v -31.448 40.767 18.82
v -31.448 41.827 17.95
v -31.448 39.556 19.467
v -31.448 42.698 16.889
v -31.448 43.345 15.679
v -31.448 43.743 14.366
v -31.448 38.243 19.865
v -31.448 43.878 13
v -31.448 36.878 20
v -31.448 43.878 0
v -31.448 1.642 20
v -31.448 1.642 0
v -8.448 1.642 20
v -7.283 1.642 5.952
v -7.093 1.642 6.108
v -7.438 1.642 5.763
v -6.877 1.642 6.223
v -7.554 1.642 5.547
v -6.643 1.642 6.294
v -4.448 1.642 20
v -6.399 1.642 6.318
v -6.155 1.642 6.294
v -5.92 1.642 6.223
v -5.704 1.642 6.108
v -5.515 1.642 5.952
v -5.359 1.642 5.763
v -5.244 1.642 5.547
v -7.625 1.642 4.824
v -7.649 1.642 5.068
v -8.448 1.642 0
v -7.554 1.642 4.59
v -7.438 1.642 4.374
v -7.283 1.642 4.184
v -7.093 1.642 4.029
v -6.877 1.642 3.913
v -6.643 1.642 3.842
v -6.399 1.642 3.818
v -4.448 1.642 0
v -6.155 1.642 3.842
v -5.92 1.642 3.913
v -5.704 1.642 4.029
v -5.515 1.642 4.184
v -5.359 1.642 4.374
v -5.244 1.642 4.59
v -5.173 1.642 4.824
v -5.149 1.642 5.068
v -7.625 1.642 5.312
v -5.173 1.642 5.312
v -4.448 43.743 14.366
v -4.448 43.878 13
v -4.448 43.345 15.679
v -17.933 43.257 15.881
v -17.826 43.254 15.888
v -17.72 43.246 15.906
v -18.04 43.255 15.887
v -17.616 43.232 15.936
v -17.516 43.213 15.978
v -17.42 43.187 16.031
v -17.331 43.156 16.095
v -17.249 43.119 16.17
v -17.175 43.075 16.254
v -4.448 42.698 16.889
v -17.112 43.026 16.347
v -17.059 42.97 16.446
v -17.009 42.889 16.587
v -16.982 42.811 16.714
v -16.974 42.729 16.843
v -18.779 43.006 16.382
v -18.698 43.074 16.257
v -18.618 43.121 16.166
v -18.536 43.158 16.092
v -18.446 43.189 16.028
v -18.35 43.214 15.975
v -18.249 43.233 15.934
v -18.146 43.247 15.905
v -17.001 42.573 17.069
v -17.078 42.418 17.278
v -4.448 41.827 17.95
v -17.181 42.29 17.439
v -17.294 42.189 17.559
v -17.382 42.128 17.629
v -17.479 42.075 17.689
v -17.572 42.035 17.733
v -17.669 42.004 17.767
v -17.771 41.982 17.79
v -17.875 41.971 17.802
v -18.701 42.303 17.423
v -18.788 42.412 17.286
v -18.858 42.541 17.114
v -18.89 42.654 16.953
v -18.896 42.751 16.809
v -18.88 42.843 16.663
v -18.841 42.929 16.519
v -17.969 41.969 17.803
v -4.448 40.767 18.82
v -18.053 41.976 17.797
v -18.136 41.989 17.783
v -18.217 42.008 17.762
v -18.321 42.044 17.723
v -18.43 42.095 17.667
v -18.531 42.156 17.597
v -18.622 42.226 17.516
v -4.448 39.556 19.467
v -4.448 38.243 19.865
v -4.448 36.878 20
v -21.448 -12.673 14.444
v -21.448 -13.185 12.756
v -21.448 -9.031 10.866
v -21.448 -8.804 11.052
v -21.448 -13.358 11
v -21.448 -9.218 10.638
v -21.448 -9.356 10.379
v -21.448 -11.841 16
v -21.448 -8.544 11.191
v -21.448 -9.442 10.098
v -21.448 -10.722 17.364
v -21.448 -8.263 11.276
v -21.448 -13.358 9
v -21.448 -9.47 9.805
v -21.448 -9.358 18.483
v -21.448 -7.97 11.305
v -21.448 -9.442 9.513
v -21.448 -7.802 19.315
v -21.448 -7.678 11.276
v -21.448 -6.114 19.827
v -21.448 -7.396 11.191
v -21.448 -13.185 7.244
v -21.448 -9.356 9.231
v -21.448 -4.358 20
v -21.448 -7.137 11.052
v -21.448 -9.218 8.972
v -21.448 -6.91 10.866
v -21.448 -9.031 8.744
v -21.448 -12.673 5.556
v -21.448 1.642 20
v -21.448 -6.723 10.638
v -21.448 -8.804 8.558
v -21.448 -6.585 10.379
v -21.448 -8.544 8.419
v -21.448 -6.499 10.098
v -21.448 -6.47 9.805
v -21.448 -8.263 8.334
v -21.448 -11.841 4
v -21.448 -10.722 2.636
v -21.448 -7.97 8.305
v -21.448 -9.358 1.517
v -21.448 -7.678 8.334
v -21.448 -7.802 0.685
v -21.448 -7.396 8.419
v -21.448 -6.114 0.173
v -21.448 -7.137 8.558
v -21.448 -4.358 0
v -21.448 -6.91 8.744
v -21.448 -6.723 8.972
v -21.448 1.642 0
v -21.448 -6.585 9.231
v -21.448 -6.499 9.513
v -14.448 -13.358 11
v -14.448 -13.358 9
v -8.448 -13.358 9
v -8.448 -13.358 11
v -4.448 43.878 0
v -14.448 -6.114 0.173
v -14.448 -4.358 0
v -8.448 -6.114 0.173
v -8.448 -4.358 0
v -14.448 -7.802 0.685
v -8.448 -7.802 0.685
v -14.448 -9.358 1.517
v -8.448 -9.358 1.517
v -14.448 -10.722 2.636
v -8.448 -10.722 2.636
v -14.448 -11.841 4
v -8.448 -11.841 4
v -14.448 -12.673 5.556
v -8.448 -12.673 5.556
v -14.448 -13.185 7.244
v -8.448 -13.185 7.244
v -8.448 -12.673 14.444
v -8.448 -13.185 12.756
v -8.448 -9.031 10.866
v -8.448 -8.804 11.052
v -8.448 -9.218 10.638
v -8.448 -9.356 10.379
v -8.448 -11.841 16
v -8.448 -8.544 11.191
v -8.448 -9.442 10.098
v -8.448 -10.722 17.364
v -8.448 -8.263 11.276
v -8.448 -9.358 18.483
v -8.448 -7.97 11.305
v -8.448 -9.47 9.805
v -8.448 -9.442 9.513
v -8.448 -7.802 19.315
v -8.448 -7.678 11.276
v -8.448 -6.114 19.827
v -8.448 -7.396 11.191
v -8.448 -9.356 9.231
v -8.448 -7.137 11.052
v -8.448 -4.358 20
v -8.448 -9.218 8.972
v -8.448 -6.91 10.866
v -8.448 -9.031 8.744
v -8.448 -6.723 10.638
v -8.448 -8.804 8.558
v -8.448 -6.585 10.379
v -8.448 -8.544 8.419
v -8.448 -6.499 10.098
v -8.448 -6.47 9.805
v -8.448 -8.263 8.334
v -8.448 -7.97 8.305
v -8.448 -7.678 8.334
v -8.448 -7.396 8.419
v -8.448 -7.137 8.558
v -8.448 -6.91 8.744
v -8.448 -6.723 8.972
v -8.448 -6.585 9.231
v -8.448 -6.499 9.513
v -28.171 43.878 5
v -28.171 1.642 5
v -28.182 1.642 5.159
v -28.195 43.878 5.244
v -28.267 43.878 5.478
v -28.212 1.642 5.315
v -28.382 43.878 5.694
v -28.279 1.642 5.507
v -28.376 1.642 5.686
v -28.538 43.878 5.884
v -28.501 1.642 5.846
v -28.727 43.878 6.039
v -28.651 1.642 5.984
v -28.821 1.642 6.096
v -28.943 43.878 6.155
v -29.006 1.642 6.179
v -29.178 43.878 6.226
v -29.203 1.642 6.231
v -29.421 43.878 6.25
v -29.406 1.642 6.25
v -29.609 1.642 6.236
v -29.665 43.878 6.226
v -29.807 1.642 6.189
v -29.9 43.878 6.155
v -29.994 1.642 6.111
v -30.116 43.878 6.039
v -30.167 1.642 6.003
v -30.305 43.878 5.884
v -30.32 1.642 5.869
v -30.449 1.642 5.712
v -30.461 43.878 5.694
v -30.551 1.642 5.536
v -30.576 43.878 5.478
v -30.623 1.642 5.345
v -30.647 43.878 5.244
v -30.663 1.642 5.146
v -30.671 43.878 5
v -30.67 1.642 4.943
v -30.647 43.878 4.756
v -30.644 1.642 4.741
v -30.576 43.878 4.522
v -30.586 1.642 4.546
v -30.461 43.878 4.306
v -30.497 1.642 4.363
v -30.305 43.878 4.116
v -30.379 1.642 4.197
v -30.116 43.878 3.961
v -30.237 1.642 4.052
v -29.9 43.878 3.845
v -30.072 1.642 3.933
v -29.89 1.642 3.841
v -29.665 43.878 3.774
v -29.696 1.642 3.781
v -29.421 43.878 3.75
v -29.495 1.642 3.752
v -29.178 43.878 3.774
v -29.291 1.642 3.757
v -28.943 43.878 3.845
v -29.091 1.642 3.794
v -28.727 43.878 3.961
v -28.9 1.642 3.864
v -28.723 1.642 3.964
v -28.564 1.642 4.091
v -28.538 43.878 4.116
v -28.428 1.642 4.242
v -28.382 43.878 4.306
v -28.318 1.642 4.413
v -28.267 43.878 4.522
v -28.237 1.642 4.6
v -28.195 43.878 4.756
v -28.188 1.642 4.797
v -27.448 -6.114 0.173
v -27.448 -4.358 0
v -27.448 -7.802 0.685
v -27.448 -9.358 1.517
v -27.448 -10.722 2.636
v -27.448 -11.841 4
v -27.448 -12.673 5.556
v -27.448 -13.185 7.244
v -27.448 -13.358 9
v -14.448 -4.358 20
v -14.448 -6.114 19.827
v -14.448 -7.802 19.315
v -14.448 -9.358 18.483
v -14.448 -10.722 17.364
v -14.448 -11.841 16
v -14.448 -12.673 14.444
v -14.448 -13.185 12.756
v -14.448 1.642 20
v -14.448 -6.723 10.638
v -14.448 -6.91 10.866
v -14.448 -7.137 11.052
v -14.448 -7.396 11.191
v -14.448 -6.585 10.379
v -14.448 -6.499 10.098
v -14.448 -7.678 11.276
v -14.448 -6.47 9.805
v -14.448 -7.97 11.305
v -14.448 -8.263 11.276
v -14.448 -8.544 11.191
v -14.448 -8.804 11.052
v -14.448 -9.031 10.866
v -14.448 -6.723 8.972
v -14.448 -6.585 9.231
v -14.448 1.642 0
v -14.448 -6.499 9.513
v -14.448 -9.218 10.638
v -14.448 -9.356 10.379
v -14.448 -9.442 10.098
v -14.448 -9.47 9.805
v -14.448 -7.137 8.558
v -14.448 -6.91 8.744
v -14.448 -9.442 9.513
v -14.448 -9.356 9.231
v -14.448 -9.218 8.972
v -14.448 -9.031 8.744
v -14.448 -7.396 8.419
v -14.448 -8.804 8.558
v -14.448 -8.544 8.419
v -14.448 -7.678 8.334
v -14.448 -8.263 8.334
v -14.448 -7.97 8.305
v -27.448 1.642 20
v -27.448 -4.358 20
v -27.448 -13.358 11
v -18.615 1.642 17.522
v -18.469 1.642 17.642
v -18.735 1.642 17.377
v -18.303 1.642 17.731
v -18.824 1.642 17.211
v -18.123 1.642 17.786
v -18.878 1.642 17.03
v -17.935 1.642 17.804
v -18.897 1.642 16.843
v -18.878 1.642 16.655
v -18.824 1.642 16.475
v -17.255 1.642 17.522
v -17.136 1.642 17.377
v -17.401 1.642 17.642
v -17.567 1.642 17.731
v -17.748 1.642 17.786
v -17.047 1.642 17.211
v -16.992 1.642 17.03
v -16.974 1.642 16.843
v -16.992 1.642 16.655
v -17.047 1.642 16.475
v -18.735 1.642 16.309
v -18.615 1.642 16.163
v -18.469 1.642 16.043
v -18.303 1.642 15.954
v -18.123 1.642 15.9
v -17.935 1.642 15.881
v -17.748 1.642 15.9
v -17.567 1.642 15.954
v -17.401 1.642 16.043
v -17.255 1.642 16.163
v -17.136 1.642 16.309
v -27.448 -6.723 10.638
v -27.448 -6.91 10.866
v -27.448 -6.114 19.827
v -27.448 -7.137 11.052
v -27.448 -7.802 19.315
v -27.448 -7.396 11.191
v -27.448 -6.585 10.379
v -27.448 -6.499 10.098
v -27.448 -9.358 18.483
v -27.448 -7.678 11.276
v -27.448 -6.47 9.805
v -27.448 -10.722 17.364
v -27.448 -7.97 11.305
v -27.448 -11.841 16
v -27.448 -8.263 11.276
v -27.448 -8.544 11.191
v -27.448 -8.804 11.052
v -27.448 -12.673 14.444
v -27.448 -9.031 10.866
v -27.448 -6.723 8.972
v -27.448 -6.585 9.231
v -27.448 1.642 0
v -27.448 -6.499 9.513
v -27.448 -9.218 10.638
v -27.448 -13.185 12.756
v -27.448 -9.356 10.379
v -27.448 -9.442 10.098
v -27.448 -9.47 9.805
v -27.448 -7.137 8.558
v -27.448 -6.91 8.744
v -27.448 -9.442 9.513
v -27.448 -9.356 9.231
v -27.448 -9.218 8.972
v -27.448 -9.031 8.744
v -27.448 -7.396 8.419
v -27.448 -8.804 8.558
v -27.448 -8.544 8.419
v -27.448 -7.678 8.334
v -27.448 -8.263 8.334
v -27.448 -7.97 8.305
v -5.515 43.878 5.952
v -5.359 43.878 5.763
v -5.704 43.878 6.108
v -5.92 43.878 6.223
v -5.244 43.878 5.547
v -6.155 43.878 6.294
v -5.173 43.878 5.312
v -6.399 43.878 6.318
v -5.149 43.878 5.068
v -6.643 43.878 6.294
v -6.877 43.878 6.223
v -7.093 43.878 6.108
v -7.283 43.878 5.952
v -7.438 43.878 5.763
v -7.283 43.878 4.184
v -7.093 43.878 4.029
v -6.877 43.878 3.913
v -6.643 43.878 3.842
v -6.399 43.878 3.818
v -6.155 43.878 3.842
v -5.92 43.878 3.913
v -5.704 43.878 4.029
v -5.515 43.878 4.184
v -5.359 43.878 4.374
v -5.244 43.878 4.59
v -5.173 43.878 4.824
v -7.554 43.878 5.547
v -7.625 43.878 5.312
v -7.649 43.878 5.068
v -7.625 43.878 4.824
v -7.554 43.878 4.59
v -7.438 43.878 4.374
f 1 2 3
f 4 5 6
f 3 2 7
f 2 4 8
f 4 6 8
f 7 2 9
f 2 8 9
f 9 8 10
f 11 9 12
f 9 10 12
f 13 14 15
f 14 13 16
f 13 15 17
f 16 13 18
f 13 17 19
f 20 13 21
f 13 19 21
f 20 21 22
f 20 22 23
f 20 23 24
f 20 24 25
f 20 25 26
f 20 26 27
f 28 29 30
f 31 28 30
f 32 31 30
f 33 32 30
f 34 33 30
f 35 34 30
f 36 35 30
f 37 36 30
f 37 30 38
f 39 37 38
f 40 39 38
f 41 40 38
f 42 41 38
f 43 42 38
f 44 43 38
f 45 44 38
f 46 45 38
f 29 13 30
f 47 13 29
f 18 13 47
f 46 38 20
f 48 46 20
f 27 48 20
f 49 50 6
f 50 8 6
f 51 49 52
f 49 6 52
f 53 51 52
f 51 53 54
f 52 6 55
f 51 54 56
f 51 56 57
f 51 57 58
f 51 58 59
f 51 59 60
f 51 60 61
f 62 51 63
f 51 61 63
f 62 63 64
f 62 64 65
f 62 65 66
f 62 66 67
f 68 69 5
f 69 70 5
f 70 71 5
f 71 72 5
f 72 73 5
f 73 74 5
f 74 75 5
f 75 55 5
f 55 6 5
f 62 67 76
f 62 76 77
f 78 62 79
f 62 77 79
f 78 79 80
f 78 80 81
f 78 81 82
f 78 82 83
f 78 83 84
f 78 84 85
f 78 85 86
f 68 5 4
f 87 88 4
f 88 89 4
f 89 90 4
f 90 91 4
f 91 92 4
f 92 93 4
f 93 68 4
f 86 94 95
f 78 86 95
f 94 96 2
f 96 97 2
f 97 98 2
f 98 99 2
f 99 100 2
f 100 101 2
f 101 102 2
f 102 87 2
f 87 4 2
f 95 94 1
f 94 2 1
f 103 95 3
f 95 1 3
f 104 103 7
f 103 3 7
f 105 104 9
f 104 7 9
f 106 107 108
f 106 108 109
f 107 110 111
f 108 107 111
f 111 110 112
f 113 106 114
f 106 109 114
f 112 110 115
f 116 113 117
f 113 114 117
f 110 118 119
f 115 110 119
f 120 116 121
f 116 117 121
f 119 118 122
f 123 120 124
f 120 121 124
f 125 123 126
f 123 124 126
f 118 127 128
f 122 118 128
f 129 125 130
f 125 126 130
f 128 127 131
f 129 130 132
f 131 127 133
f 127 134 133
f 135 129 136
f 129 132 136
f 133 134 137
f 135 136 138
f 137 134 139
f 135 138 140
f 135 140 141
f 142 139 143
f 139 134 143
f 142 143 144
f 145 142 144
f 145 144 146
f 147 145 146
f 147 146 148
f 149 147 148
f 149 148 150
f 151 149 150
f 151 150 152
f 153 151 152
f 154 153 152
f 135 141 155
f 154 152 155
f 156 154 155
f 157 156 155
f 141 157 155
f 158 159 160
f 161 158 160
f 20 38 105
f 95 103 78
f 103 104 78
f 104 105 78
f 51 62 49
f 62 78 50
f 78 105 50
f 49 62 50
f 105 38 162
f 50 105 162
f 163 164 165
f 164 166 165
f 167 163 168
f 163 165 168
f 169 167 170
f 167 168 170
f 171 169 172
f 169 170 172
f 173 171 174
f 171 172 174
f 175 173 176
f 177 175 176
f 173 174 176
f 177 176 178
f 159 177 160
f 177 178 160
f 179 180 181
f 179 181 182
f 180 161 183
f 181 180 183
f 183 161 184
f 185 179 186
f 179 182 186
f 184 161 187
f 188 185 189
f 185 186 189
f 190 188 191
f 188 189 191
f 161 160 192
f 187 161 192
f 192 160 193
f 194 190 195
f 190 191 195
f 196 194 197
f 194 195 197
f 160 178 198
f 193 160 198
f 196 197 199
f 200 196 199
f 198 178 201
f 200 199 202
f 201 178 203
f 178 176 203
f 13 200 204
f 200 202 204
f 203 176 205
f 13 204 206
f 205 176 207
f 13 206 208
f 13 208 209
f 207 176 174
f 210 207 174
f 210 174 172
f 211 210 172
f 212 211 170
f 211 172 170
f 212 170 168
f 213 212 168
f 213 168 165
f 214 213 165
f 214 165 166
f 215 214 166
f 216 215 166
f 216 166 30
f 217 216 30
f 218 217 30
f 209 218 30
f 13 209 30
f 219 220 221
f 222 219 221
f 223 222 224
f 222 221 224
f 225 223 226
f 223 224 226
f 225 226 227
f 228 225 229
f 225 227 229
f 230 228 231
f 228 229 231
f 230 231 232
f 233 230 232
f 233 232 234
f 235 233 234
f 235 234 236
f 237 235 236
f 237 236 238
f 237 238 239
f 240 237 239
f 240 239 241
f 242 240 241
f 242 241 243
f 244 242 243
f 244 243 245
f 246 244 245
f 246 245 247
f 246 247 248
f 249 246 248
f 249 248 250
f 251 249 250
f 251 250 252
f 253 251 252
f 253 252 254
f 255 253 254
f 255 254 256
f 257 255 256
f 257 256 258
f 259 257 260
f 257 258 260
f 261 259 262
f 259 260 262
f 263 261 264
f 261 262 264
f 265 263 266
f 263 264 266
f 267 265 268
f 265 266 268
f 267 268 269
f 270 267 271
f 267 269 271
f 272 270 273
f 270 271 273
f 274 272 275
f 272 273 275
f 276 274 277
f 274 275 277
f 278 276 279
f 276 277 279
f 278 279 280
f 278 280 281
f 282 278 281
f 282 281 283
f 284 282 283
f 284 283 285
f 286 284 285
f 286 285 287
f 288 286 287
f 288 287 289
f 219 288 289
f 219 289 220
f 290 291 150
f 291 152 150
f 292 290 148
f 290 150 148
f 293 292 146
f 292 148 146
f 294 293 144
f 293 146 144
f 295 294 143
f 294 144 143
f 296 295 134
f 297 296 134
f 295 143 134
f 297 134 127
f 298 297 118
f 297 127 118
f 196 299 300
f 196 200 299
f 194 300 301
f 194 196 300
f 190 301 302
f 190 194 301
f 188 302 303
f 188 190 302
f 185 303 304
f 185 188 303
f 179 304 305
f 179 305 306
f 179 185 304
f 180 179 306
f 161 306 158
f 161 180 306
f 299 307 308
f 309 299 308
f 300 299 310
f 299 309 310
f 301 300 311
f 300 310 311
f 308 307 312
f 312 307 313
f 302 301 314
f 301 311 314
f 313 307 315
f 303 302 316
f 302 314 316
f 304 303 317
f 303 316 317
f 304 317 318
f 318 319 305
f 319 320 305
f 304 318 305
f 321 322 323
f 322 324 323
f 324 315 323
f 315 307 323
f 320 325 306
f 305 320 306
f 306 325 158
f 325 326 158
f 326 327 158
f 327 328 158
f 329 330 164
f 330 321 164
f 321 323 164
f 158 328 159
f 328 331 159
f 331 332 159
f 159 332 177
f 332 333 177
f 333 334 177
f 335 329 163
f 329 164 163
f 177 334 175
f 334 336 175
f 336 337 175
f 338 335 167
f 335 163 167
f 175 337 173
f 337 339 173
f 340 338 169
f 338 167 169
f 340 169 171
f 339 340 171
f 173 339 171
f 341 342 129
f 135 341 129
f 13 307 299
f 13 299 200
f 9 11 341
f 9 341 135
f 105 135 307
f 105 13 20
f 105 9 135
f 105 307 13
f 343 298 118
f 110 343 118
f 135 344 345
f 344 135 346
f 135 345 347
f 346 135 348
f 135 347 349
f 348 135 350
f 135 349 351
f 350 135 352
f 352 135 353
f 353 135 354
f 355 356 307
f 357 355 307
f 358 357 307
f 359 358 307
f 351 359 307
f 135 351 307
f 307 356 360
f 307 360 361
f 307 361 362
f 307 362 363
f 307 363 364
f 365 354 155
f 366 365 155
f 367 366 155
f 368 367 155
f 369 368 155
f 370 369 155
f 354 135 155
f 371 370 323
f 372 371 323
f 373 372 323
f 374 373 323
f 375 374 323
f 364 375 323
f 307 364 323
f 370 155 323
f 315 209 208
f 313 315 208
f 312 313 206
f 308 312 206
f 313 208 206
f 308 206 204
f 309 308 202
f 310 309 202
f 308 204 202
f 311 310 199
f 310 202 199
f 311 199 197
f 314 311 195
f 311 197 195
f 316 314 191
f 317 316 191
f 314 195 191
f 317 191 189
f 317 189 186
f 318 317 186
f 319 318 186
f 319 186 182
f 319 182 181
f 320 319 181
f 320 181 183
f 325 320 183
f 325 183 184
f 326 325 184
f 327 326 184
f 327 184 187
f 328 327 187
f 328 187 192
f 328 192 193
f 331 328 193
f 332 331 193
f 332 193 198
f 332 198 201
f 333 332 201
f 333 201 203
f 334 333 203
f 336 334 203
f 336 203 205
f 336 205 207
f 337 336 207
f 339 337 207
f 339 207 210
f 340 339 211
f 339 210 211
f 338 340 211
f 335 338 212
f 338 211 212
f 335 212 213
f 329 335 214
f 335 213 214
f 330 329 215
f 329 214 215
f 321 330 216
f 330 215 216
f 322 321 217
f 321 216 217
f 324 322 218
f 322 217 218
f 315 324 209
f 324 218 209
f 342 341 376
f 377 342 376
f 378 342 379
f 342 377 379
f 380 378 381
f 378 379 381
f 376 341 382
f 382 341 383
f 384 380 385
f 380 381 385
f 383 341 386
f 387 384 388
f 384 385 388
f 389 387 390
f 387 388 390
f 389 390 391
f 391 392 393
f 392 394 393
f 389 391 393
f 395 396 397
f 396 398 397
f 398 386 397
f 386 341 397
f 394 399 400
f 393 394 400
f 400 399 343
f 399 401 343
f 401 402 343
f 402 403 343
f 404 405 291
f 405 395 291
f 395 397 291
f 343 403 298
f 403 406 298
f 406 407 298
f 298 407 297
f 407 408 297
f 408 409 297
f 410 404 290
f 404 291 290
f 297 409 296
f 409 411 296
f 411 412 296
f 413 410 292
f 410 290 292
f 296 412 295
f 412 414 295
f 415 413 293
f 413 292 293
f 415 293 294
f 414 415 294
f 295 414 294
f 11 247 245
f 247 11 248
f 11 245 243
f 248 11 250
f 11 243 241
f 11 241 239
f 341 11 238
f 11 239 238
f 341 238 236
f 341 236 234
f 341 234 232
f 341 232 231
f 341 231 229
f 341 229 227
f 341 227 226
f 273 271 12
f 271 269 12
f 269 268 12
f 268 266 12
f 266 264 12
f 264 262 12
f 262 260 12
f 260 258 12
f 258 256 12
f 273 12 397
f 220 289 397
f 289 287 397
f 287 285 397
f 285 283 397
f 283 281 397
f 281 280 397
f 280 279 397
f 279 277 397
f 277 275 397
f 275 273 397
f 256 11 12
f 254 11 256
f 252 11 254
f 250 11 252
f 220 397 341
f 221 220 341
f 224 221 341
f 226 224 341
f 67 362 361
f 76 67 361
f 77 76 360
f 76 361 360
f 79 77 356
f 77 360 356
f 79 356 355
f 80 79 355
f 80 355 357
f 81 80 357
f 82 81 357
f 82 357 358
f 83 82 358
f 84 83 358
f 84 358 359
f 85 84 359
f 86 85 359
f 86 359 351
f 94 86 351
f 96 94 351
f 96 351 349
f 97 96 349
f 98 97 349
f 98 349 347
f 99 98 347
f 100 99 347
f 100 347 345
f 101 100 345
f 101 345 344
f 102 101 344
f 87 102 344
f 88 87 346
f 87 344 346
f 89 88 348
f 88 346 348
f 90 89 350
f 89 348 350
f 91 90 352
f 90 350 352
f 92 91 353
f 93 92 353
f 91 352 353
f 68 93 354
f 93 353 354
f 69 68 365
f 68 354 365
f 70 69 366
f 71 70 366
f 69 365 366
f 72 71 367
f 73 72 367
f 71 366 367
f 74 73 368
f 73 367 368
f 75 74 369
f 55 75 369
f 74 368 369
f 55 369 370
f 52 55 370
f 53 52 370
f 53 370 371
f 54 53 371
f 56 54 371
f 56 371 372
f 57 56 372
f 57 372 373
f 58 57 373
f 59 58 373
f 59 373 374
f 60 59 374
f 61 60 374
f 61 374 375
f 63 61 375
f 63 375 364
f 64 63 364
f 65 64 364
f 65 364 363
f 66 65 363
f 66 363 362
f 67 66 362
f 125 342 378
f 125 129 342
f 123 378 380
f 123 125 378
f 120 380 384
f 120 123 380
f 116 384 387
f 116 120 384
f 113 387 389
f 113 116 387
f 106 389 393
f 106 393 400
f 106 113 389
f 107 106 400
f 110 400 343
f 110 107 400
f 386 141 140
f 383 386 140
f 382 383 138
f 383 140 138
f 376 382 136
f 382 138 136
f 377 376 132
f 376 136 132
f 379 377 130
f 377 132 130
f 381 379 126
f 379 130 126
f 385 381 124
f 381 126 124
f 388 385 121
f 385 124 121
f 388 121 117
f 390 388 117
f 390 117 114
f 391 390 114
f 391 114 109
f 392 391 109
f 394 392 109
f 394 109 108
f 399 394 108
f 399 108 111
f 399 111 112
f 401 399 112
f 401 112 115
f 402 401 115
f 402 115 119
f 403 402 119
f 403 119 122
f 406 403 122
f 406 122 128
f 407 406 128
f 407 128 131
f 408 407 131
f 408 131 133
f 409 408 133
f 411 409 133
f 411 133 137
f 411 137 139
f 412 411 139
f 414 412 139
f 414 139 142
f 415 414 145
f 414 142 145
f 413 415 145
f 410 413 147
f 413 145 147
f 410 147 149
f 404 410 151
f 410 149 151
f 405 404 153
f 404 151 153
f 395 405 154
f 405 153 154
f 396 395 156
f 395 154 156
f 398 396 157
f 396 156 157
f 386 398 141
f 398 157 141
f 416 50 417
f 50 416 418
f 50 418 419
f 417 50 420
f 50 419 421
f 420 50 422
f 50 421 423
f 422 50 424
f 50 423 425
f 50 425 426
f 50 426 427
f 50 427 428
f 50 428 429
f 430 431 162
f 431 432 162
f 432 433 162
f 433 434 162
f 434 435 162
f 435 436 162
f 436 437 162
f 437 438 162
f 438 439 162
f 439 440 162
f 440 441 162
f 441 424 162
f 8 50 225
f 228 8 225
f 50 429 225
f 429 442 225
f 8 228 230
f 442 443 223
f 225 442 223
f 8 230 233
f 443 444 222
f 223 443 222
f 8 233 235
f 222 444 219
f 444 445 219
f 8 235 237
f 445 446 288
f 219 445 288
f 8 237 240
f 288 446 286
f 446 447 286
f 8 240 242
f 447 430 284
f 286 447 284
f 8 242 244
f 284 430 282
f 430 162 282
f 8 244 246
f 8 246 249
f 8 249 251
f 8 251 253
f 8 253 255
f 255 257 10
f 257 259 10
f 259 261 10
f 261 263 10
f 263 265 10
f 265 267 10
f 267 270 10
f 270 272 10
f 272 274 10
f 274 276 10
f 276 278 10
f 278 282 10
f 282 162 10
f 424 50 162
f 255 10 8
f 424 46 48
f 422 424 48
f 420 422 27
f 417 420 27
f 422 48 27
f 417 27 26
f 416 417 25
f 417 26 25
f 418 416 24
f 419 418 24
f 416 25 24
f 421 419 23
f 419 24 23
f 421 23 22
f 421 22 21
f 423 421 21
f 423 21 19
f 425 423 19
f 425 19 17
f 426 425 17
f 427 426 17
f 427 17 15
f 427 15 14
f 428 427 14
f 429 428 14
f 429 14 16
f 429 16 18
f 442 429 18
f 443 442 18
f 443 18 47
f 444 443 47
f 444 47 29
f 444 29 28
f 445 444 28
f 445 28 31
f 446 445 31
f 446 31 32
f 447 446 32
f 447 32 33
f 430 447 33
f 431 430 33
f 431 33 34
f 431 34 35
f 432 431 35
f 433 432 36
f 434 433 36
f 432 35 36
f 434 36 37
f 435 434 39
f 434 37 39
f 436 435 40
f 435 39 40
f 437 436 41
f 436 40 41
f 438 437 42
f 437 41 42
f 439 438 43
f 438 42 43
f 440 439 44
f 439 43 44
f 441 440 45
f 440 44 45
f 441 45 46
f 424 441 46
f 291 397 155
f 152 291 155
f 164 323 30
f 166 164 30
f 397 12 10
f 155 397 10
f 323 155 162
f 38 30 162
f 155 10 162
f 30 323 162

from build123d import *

# Parameters (mm, degrees)
PAD_DEPTH       = 20
FILLET_R        = 7
SKETCH001_R     = 1.5
POCKET_DEPTH    = 23.001
SKETCH002_R     = 1.25
SKETCH002_R_2   = 0.961399
POCKET001_DEPTH = 42.236626
FILLET001_R     = 9
FILLET002_R     = 9
FILLET003_R     = 9
FILLET004_R     = 9


with BuildPart() as part:
    # Sketch → Pad (new body)
    with BuildSketch(Plane.XY):
        Polygon((-31.448001, 43.877556), (-31.448001, 36.642305), (-31.448001, 1.642305), (-27.448001, 1.642283), (-27.448001, -13.357717), (-21.448001, -13.357717), (-21.448001, 1.642283), (-14.448001, 1.642283), (-14.448001, -13.357717), (-8.448001, -13.357717), (-8.448001, 1.64193), (-4.448001, 1.64193), (-4.448001, 36.64193), (-4.448001, 43.877556), align=None)
    extrude(amount=PAD_DEPTH)

    # Fillet
    fillet_edges = [part.edges().sort_by_distance(p)[0] for p in [
        (-17.948001, 43.877556, 20),
    ]]
    fillet(fillet_edges, radius=FILLET_R)

    # Sketch001 (on Face15 of Fillet) → Pocket (cut, through all)
    with BuildSketch(Plane.YZ.offset(-8.448001)):
        with Locations((-7.970362, 9.805142)):
            Circle(SKETCH001_R)
    extrude(amount=-POCKET_DEPTH, mode=Mode.SUBTRACT)

    # Sketch002 (on Face16 of Pocket) → Pocket001 (cut, through all)
    with BuildSketch(Plane.XZ.offset(-1.64193)):
        with Locations((-6.398813, 5.068225)):
            Circle(SKETCH002_R)
        with Locations((-29.421452, 5)):
            Circle(SKETCH002_R)
        with Locations((-17.935286, 16.84268)):
            Circle(SKETCH002_R_2)
    extrude(amount=-POCKET001_DEPTH, mode=Mode.SUBTRACT)

    # Fillet001
    fillet001_edges = [part.edges().sort_by_distance(p)[0] for p in [
        (-11.448001, -13.357717, 20),
    ]]
    fillet(fillet001_edges, radius=FILLET001_R)

    # Fillet002
    fillet002_edges = [part.edges().sort_by_distance(p)[0] for p in [
        (-24.448001, -13.357717, 20),
    ]]
    fillet(fillet002_edges, radius=FILLET002_R)

    # Fillet003
    fillet003_edges = [part.edges().sort_by_distance(p)[0] for p in [
        (-11.448001, -13.357717, 0),
    ]]
    fillet(fillet003_edges, radius=FILLET003_R)

    # Fillet004
    fillet004_edges = [part.edges().sort_by_distance(p)[0] for p in [
        (-24.448001, -13.357717, 0),
    ]]
    fillet(fillet004_edges, radius=FILLET004_R)


solid = part.part
